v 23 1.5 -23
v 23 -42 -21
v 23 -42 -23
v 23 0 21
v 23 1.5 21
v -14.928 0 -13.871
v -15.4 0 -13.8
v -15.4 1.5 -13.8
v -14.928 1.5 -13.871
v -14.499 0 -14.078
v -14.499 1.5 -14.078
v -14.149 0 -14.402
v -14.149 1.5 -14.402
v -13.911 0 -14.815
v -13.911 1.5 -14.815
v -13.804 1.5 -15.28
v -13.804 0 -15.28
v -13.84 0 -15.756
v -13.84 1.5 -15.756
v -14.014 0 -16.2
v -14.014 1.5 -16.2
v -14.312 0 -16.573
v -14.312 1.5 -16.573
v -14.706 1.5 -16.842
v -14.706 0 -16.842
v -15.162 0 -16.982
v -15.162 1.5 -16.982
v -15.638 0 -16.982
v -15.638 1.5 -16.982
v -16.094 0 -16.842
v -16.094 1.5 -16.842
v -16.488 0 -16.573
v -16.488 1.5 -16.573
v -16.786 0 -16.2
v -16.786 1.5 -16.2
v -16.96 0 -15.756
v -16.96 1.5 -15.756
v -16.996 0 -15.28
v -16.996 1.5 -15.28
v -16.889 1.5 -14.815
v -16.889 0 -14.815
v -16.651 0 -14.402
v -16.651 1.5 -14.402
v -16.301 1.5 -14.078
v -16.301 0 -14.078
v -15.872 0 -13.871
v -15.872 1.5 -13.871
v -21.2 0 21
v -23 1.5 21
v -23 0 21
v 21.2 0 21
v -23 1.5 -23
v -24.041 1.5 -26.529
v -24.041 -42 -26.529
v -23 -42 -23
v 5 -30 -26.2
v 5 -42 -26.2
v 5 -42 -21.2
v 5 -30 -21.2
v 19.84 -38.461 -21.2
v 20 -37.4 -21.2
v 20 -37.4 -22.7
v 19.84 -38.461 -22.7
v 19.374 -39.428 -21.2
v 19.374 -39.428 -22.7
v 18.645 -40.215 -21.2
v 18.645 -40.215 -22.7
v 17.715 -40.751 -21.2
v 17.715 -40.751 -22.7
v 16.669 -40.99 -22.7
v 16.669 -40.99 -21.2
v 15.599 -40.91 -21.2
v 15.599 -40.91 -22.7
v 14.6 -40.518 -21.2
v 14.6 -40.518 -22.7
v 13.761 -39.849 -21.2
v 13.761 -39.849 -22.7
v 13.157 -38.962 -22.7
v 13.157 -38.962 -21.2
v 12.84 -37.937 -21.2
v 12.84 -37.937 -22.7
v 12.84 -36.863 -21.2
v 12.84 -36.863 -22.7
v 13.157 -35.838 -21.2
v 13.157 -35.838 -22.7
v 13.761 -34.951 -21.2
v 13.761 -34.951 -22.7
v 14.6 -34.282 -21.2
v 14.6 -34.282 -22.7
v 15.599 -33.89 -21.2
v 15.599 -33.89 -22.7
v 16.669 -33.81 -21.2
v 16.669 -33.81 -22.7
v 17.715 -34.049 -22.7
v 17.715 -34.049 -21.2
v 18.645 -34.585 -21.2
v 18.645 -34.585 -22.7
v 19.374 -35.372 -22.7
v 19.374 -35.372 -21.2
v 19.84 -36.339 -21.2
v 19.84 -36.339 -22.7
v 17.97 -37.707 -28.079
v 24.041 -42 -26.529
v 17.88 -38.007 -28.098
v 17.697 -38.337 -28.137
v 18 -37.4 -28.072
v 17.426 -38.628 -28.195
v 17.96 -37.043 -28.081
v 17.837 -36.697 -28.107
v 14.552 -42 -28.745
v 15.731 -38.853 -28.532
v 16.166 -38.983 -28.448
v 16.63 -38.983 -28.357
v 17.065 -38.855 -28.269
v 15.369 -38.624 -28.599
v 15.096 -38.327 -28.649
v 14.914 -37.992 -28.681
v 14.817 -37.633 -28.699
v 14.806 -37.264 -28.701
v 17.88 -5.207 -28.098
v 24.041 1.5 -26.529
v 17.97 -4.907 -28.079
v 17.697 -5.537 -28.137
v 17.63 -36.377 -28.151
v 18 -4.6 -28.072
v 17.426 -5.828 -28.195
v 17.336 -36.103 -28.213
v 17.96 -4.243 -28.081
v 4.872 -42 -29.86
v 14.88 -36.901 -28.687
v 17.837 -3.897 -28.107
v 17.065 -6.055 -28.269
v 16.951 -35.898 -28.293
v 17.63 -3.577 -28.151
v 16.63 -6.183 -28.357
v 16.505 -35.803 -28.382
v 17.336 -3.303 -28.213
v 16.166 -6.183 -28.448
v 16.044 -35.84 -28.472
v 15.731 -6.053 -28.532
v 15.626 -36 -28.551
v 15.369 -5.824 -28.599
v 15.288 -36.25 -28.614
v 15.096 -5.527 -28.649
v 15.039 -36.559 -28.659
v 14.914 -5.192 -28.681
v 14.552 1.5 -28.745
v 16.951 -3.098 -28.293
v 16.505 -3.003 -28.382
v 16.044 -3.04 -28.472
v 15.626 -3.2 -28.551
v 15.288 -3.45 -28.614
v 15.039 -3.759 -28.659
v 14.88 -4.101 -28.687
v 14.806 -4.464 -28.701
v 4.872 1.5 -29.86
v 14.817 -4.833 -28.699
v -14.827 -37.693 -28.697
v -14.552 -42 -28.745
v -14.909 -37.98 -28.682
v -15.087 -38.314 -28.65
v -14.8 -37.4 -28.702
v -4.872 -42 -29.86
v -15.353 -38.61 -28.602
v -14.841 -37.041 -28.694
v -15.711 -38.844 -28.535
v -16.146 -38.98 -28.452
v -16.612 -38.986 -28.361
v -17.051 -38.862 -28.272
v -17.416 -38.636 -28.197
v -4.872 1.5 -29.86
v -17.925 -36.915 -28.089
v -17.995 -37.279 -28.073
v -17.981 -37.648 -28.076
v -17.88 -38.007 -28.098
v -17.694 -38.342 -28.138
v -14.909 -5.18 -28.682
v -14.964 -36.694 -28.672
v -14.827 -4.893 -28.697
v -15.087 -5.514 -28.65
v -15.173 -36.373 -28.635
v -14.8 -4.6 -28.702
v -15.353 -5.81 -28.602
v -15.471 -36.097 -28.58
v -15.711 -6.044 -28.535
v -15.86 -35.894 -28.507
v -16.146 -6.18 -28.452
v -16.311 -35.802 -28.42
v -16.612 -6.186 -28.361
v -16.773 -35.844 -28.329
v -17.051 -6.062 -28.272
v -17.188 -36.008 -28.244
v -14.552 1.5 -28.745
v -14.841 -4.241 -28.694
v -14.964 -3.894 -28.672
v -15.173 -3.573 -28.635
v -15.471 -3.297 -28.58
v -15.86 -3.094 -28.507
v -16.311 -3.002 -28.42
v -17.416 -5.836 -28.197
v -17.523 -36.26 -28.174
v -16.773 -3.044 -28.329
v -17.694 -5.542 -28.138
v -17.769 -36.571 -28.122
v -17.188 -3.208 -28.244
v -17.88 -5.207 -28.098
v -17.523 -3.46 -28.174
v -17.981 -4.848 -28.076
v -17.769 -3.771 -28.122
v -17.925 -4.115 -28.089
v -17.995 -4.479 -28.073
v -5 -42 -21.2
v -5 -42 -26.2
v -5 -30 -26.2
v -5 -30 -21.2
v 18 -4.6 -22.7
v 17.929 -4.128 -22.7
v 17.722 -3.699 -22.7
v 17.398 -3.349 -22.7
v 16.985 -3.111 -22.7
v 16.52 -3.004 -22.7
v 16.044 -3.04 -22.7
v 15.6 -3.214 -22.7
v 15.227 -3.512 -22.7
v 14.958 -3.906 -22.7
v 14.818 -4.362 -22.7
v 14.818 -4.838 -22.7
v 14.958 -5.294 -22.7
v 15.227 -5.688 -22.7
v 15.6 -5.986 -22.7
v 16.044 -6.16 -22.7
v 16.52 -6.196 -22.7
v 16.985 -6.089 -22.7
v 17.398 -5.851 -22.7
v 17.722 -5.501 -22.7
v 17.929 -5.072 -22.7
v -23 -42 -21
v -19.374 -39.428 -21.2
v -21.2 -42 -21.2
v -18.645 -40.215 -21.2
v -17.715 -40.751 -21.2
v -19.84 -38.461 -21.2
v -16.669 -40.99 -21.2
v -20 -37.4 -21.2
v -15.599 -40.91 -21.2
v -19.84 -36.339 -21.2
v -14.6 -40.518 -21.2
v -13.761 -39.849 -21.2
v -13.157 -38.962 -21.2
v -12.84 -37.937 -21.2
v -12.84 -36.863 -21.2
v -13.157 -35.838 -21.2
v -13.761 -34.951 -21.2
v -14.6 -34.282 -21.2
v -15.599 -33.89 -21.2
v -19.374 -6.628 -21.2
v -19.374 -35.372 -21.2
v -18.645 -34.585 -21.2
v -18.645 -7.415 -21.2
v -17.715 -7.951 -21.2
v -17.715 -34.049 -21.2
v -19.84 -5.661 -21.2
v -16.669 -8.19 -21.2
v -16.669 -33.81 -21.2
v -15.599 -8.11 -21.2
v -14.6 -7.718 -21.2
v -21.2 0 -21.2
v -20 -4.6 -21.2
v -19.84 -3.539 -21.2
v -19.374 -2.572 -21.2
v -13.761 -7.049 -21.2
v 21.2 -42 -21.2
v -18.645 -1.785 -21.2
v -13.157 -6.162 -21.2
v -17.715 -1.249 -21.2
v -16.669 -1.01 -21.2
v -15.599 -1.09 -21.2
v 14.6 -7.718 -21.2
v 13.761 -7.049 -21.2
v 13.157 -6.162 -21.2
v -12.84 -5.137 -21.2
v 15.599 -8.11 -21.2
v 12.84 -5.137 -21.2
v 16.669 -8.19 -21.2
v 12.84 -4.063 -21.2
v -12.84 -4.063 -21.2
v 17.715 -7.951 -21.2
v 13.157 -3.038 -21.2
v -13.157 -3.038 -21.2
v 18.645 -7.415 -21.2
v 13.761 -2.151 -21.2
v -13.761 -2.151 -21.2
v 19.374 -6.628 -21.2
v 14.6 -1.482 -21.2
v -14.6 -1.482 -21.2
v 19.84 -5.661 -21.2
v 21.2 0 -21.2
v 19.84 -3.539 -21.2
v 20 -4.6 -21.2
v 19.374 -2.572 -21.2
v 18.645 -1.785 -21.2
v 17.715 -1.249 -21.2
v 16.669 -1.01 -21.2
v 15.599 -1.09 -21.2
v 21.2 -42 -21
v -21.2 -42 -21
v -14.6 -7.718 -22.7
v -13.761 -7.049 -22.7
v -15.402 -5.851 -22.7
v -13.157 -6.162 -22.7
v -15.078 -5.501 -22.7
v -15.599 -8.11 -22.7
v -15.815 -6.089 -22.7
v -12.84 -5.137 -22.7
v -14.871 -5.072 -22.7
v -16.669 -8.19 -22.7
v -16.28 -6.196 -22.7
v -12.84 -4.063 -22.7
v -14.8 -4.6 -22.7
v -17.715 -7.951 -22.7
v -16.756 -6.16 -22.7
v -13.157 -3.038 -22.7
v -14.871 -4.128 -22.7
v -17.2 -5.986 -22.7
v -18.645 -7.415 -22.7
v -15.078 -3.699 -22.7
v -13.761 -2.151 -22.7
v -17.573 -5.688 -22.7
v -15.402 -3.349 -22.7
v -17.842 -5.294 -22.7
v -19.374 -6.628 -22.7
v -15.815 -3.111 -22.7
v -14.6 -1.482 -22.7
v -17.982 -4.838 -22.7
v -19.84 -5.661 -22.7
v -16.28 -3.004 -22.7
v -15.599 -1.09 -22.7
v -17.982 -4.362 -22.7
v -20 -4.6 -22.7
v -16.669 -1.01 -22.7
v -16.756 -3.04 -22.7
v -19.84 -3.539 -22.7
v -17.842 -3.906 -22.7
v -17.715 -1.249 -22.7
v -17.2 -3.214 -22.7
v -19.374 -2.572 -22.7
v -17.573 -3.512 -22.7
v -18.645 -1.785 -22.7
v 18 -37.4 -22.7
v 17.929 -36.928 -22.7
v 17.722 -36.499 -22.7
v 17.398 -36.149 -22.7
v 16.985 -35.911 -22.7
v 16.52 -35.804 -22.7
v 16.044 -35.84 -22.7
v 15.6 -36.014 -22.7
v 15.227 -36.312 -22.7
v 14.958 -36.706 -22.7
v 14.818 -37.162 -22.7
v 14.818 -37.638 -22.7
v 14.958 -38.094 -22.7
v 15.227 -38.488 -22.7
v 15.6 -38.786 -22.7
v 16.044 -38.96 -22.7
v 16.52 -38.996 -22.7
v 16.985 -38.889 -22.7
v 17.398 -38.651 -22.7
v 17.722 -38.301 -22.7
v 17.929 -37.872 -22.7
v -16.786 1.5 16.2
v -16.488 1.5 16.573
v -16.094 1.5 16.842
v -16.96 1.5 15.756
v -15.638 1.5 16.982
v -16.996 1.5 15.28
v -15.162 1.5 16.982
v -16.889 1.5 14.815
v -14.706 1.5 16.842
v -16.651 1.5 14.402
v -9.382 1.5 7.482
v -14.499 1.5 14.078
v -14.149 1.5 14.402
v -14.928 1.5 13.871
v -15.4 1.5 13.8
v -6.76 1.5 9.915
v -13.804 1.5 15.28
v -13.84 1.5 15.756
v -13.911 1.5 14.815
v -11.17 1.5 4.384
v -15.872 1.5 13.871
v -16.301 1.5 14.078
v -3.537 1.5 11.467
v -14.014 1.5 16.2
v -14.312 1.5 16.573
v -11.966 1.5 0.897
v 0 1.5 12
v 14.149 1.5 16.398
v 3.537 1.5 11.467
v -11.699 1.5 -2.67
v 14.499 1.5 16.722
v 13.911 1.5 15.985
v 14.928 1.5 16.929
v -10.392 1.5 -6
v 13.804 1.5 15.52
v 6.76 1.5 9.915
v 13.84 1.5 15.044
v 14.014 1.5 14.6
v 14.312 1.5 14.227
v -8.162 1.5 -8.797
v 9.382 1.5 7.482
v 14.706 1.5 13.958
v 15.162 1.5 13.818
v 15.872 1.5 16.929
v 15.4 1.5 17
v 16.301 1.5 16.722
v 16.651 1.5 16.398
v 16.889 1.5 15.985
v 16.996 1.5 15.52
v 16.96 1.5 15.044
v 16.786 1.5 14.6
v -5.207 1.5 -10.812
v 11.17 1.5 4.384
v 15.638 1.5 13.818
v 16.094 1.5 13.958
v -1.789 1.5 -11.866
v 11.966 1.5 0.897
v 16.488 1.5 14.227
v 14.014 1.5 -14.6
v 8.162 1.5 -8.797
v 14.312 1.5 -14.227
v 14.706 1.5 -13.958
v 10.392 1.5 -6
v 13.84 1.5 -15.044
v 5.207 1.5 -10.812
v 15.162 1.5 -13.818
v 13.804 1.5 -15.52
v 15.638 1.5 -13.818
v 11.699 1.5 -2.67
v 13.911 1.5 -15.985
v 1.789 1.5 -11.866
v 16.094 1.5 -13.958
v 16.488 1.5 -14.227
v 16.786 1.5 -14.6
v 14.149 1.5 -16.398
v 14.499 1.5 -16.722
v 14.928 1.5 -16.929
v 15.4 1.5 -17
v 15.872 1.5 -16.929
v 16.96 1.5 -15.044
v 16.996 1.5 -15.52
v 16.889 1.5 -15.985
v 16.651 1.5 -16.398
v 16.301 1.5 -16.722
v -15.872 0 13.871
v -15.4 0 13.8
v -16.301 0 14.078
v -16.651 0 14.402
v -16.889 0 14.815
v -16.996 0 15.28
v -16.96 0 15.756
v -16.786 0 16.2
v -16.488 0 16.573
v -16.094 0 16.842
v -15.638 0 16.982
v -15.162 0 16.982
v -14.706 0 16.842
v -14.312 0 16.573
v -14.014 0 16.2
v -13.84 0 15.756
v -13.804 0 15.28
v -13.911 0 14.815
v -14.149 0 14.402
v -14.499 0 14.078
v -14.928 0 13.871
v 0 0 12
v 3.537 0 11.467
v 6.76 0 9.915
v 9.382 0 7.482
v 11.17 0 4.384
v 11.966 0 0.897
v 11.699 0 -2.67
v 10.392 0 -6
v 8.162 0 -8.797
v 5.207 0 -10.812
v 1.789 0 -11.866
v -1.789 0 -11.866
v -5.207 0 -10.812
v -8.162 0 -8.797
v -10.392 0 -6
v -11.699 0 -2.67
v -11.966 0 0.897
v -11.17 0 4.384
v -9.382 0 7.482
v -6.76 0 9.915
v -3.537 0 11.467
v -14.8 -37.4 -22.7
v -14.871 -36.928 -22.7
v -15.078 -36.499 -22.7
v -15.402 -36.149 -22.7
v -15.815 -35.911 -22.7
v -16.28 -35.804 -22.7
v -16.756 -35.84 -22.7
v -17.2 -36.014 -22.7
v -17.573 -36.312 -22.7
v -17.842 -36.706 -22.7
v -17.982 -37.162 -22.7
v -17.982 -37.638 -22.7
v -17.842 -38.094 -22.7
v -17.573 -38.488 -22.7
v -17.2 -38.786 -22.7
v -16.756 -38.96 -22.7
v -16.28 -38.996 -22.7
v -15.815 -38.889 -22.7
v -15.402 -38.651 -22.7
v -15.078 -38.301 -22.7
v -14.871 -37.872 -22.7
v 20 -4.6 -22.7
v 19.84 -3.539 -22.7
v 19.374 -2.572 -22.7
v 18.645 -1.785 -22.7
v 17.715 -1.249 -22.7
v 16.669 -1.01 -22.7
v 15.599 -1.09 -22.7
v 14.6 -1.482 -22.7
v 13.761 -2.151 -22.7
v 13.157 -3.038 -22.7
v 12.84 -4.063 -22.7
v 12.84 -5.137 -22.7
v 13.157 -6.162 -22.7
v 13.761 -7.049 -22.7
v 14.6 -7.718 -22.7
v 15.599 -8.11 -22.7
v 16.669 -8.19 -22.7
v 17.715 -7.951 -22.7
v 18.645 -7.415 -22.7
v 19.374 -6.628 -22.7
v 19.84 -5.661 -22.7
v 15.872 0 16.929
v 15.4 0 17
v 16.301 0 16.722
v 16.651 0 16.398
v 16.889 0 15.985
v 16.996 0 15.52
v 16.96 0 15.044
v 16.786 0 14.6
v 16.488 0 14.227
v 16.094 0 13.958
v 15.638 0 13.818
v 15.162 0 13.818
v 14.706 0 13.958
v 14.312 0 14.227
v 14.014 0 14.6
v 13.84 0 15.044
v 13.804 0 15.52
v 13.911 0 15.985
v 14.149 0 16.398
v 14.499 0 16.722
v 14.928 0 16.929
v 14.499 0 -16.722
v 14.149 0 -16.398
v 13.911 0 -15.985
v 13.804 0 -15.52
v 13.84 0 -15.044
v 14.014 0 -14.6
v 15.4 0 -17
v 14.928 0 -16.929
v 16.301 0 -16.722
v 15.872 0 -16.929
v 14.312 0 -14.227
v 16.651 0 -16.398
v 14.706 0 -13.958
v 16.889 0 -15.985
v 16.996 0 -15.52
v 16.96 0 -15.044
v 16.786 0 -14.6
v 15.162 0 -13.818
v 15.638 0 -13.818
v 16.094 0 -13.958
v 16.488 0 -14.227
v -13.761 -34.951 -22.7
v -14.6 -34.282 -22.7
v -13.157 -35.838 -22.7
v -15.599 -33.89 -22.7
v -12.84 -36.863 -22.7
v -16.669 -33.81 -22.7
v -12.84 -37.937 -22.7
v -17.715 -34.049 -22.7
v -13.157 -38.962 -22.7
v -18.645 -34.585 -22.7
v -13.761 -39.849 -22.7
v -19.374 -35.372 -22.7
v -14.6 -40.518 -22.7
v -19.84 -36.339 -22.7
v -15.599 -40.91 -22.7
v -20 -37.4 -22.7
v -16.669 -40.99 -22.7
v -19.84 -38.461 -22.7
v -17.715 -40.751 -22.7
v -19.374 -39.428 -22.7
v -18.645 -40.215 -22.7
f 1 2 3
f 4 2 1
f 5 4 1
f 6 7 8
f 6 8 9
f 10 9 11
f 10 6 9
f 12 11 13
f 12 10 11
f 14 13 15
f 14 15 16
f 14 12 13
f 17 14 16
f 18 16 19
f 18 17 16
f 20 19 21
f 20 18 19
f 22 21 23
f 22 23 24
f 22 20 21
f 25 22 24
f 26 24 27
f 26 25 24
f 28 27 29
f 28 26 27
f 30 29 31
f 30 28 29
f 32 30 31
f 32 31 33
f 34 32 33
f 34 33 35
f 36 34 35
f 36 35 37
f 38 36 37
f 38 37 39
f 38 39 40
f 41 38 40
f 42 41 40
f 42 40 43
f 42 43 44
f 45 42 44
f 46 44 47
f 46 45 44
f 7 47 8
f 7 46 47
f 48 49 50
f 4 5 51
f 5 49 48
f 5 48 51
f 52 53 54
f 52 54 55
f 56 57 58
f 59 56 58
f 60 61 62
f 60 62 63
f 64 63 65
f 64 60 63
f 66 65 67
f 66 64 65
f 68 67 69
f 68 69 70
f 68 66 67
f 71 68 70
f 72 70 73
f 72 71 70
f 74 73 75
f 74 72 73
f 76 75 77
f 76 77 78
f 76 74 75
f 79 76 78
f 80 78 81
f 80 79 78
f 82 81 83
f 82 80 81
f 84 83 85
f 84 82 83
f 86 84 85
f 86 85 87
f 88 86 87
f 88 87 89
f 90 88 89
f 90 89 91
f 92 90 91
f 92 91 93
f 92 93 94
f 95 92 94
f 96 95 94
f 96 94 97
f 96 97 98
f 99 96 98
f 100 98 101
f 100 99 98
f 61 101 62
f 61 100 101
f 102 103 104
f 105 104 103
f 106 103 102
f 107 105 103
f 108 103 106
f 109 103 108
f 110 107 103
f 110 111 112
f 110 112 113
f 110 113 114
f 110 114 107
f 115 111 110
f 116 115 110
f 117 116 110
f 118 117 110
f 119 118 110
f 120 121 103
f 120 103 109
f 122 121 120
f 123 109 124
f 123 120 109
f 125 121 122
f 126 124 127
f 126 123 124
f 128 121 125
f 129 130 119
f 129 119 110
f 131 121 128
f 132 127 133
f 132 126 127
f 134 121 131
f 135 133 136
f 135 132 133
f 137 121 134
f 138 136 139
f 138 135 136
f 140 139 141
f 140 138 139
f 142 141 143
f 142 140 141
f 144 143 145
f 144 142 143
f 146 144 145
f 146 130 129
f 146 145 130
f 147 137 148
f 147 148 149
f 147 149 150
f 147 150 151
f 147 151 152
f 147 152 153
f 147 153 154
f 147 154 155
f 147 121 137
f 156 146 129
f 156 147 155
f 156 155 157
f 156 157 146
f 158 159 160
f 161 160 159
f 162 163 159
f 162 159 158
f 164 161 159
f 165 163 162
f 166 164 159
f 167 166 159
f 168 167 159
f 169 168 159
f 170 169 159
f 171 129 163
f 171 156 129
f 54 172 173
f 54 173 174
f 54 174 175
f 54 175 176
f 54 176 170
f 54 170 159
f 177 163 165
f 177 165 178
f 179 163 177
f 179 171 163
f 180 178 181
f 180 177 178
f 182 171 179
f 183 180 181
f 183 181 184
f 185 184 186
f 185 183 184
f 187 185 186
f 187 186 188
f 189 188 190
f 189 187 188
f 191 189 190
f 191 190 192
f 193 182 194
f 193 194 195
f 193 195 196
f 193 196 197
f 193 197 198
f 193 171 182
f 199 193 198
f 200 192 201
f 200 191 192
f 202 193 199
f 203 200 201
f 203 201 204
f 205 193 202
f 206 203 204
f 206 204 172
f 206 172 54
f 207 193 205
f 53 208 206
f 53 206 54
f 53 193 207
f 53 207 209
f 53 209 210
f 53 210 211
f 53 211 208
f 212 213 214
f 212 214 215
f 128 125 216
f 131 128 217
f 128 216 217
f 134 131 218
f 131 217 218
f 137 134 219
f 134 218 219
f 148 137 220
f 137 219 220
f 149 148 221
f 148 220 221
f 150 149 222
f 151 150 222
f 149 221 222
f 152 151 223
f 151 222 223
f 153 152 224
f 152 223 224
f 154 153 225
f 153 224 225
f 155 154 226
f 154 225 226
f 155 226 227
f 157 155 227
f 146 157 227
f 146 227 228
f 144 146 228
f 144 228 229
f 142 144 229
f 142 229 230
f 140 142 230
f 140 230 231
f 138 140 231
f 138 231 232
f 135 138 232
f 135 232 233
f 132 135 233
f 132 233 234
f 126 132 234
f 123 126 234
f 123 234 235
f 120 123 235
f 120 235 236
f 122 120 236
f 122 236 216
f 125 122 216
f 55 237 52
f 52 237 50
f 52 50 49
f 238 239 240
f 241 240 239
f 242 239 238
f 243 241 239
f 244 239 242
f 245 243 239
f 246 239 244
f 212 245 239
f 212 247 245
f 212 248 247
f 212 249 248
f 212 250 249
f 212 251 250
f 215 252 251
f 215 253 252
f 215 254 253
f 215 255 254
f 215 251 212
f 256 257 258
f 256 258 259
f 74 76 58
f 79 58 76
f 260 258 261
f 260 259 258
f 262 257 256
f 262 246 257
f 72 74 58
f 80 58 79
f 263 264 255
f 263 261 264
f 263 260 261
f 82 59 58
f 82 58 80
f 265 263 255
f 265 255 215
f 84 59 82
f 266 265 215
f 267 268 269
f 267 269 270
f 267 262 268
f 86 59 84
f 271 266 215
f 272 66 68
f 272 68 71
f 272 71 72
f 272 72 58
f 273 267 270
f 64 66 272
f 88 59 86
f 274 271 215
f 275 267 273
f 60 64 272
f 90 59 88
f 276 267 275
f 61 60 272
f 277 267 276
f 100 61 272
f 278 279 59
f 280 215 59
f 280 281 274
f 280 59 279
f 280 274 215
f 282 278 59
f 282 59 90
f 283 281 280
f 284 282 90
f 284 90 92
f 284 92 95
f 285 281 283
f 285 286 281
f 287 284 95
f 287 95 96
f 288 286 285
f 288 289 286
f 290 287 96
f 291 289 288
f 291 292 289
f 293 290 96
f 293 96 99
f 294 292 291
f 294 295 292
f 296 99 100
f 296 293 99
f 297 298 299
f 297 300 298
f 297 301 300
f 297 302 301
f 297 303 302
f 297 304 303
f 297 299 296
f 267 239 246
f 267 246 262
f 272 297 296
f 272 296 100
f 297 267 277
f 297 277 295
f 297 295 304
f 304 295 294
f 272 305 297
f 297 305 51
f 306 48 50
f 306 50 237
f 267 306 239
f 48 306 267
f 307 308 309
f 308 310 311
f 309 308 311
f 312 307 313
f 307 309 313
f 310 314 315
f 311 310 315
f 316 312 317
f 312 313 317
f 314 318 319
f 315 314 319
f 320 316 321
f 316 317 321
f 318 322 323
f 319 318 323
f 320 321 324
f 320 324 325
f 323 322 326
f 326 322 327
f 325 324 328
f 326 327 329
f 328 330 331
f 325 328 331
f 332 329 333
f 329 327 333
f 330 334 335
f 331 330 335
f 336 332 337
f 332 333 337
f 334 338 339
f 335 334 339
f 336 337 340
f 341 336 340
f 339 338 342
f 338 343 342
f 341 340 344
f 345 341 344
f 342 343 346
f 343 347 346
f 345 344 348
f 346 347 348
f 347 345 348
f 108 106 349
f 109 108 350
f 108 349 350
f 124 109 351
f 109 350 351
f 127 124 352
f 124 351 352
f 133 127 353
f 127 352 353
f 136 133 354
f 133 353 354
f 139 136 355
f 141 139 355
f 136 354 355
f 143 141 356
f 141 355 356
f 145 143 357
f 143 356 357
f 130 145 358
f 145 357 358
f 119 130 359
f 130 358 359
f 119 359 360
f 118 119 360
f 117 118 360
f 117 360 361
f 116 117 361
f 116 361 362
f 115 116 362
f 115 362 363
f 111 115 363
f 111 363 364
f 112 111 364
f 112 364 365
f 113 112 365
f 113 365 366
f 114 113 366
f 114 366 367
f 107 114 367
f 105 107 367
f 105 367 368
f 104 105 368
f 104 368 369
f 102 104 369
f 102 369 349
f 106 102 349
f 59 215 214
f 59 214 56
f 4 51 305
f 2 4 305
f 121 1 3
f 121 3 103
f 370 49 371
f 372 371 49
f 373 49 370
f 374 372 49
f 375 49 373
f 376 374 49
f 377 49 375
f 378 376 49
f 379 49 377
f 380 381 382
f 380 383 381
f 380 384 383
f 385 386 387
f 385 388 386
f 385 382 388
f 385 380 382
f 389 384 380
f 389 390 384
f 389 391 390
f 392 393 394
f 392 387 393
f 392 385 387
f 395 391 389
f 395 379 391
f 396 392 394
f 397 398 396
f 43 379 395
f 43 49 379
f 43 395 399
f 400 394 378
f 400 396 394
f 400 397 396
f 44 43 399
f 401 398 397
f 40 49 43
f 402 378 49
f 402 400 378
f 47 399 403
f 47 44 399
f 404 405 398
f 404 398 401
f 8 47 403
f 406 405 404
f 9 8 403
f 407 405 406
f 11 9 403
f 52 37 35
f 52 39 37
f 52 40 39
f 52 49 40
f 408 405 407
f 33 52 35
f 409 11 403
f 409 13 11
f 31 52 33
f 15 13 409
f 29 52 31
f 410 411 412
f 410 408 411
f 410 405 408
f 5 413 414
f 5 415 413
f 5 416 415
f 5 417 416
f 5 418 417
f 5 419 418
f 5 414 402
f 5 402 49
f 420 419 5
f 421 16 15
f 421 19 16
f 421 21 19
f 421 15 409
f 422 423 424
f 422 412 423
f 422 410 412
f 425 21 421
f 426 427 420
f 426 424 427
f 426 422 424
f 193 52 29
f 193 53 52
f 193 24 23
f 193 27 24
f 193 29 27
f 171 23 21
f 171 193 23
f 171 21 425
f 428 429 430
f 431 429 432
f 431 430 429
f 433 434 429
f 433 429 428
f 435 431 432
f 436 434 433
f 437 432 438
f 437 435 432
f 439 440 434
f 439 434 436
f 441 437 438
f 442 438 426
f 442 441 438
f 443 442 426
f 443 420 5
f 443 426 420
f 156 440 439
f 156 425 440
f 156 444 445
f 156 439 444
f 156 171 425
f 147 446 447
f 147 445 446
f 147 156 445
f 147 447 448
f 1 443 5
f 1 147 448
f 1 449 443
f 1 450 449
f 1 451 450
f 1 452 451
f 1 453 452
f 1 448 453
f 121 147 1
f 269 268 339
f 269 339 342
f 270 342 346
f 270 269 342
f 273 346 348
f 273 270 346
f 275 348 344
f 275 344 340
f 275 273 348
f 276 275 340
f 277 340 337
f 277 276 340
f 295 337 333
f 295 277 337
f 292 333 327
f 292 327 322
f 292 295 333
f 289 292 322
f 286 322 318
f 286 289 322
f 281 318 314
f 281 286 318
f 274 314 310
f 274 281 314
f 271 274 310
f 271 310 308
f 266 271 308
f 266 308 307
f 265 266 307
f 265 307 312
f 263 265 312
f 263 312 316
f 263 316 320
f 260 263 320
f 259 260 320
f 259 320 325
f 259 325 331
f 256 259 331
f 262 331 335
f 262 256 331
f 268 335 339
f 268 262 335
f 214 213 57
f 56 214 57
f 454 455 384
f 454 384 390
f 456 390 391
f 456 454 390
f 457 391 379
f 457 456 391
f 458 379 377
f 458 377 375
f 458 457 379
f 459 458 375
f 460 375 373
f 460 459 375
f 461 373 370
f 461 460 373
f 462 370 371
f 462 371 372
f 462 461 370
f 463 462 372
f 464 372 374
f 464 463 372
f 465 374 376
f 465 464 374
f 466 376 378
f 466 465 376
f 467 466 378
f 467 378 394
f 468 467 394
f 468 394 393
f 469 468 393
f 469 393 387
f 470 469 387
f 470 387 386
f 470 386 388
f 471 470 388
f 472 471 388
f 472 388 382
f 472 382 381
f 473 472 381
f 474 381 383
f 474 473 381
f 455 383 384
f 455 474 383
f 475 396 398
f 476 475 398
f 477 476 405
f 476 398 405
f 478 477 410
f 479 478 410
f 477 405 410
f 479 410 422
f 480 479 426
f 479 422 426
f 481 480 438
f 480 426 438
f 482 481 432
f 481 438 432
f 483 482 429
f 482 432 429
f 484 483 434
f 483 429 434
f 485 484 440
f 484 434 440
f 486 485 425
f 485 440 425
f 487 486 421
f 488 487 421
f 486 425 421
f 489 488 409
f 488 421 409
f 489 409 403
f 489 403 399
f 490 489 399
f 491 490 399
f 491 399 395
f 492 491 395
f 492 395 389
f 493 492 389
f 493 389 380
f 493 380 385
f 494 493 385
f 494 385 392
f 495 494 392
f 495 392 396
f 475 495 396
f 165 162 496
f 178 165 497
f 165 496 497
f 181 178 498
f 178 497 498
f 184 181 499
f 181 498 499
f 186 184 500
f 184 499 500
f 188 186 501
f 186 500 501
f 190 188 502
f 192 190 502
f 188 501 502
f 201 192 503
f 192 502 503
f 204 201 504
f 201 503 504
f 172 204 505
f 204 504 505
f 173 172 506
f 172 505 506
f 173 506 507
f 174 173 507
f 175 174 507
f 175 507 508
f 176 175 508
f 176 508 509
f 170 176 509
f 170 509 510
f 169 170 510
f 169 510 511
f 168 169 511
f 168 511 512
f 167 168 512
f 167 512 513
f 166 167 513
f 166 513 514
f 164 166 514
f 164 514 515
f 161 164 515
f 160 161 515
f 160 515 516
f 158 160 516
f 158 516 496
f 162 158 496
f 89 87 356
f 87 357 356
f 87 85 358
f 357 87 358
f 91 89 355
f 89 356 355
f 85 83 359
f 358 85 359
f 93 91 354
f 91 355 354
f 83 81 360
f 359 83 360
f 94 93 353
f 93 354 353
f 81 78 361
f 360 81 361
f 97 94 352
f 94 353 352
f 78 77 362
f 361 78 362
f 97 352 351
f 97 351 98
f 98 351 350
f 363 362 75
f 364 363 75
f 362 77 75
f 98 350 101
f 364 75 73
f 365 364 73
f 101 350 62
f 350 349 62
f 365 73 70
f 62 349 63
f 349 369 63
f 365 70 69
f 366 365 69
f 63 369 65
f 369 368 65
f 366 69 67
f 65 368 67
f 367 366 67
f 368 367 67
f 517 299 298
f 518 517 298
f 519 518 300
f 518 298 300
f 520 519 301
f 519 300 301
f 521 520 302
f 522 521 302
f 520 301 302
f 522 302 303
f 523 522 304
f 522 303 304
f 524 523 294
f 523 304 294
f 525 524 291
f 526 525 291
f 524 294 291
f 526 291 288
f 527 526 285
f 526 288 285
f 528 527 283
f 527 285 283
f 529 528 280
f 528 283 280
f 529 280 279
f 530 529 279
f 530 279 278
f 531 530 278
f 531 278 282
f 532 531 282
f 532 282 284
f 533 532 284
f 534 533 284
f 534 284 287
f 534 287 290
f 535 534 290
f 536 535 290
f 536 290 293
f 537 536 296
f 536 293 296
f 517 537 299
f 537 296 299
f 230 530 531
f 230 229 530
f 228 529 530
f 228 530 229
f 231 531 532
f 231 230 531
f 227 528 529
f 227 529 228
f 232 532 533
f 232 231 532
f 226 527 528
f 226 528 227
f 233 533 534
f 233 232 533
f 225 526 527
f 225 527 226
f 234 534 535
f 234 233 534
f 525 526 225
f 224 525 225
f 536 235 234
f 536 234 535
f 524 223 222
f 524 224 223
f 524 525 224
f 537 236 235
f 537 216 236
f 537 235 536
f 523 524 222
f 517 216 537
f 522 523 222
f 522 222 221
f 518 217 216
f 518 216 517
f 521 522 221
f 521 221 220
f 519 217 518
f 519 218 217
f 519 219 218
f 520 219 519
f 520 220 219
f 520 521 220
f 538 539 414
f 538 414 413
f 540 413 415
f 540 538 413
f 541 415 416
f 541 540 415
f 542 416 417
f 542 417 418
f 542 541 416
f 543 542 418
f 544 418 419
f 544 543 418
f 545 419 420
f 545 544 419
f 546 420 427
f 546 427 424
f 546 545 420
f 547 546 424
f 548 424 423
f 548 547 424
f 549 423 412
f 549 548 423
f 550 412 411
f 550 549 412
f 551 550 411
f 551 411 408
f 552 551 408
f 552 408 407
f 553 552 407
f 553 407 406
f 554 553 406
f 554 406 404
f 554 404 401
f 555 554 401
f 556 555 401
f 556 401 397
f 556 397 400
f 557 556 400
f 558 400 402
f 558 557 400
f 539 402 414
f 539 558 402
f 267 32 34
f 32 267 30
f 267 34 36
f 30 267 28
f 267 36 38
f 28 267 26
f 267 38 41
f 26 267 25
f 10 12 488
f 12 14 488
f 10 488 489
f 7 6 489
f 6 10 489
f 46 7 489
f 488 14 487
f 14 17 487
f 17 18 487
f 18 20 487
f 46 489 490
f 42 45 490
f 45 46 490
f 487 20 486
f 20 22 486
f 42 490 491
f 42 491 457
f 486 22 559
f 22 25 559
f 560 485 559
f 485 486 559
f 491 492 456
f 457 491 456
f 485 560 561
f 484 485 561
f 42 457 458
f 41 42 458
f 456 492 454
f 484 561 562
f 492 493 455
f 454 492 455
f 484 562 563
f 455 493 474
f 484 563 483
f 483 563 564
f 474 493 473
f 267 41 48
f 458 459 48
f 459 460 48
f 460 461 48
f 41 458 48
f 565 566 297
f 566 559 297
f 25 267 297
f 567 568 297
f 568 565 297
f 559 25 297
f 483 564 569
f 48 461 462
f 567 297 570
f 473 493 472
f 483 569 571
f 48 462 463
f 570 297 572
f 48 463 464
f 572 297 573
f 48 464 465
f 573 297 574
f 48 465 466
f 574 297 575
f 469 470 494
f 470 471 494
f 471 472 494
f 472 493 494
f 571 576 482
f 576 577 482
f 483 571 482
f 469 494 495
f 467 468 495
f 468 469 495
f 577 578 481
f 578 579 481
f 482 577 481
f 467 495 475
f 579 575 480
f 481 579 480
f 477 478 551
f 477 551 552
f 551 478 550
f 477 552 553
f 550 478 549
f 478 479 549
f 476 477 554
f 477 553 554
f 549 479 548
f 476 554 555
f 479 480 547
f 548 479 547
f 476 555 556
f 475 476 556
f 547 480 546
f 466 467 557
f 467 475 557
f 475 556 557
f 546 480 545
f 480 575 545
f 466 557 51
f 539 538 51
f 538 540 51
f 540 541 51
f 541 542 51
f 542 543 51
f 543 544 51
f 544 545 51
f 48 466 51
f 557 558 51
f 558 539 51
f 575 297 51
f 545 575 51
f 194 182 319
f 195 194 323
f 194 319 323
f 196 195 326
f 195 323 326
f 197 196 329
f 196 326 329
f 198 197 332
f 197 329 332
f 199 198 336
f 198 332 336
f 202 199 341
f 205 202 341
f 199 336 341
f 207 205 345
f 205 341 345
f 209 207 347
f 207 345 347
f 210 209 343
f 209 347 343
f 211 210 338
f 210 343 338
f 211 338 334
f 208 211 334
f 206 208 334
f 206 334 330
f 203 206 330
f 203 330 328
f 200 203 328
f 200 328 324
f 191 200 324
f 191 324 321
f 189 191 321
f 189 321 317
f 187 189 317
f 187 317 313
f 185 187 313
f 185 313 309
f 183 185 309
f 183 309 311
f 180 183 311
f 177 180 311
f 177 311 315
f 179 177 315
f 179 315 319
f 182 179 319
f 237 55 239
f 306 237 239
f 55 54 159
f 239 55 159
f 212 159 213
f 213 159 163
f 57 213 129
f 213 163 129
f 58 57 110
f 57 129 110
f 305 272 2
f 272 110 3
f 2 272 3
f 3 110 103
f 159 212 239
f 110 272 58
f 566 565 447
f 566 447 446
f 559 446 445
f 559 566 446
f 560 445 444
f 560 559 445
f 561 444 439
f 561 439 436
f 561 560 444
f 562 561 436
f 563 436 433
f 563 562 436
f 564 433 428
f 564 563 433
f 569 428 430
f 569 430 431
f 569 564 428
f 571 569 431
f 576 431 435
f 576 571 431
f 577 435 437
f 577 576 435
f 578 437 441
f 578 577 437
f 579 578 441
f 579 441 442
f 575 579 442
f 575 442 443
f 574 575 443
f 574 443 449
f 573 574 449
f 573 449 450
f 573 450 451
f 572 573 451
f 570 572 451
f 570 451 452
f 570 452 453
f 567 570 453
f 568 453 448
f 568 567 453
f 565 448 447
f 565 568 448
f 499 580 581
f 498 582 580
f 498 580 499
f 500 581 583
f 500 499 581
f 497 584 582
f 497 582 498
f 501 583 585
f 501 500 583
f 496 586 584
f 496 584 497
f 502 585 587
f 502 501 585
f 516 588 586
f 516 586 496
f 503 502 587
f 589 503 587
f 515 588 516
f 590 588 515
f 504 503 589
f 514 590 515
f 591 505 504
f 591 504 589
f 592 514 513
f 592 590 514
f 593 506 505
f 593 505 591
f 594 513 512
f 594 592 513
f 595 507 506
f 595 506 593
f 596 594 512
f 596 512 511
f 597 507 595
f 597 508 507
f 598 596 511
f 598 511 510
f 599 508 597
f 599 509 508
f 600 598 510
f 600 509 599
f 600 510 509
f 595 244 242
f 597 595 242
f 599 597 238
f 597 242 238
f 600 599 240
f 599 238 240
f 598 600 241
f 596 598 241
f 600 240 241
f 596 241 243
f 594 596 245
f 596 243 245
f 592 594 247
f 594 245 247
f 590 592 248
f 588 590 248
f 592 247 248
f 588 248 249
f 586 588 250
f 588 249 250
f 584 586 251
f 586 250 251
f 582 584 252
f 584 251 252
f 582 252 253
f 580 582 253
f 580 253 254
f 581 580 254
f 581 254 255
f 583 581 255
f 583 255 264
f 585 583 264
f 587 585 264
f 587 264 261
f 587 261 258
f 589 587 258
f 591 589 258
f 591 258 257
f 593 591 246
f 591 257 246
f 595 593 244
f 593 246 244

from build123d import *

# Parameters (mm, degrees)
SKETCH4_W                                  = 42
SKETCH4_H                                  = 42
SKETCH4_R                                  = 1.6
BOSS_EXTRUDE1_DEPTH                        = 1.5
SKETCH5_R                                  = 12
CUT_EXTRUDE1_DEPTH                         = 30.736341402
BOSS_EXTRUDE2_DEPTH                        = 2
SKETCH7_W                                  = 46
SKETCH7_H                                  = 43.5
BOSS_EXTRUDE3_DEPTH                        = 2
CUT_EXTRUDE2_DEPTH                         = 0.2
SKETCH9_W                                  = 42.4
SKETCH9_H                                  = 42
CUT_EXTRUDE3_DEPTH                         = 0.2
BOSS_EXTRUDE4_DEPTH                        = 43.5
SKETCH16_W                                 = 10
SKETCH16_H                                 = 5
CUT_EXTRUDE6_DEPTH                         = 12
SKETCH12_R                                 = 1.6
CUT_EXTRUDE8_DEPTH                         = 65.209004806
SKETCH18_R                                 = 3.6
CUT_EXTRUDE9_DEPTH                         = 1.5
MIRROR7_AT_THE_SECOND_PLANE_COPY_1_SKETC_R = 3.6
MIRROR7_AT_THE_SECOND_PLANE_COPY_1_DEPTH   = 1.5
CUT_EXTRUDE10_REACH                        = 66.209
CUT_EXTRUDE10_END_RADIUS                   = 85
SKETCH22_R                                 = 1.6


with BuildPart() as part:
    # Sketch4 → Boss-Extrude1 (new body)
    with BuildSketch(Plane(origin=(0, 0, 0), x_dir=(1, 0, 0), z_dir=(0, 1, 0))):
        Rectangle(SKETCH4_W, SKETCH4_H)
        with Locations(Location((-15.4, 15.4, 0), (0, 0, 270))):
            Circle(SKETCH4_R, mode=Mode.SUBTRACT)
        with Locations(Location((15.4, 15.4, 0), (0, 0, 90))):
            Circle(SKETCH4_R, mode=Mode.SUBTRACT)
        with Locations(Location((15.4, -15.4, 0), (0, 0, 270))):
            Circle(SKETCH4_R, mode=Mode.SUBTRACT)
        with Locations(Location((-15.4, -15.4, 0), (0, 0, 90))):
            Circle(SKETCH4_R, mode=Mode.SUBTRACT)
    extrude(amount=BOSS_EXTRUDE1_DEPTH)

    # Sketch5 → Cut-Extrude1 (cut, through all)
    with BuildSketch(Plane(origin=(0, 1.5, 0), x_dir=(1, 0, 0), z_dir=(0, 1, 0))):
        with Locations(Location((0, 0, 0), (0, 0, 270))):
            Circle(SKETCH5_R)
    extrude(amount=-CUT_EXTRUDE1_DEPTH, mode=Mode.SUBTRACT)

    # Sketch6 → Boss-Extrude2 (add)
    with BuildSketch(Plane(origin=(21, 0, 0), x_dir=(0, 0, -1), z_dir=(1, 0, 0))):
        Polygon((-21, 0), (21, -42), (21, 0), (21, 1.5), (-21, 1.5), align=None)
    boss_extrude2 = extrude(amount=BOSS_EXTRUDE2_DEPTH)

    # Mirror1: Boss-Extrude2 across plane
    add(boss_extrude2.mirror(Plane(origin=(0, 0, 0), x_dir=(0, 0, 1), z_dir=(1, 0, 0))))

    # Sketch7 → Boss-Extrude3 (add)
    with BuildSketch(Plane(origin=(0, 0, -21), x_dir=(-1, 0, 0), z_dir=(0, 0, -1))):
        with Locations((0, -20.25)):
            Rectangle(SKETCH7_W, SKETCH7_H)
    extrude(amount=BOSS_EXTRUDE3_DEPTH)

    # Sketch8 → Cut-Extrude2 (cut)
    with BuildSketch(Plane(origin=(-21, 0, 0), x_dir=(0, 0, -1), z_dir=(1, 0, 0))):
        Polygon((-21, 0), (21, -42), (21, 0), align=None)
    cut_extrude2 = extrude(amount=-CUT_EXTRUDE2_DEPTH, mode=Mode.SUBTRACT)

    # Mirror2: Cut-Extrude2 across plane
    add(cut_extrude2.mirror(Plane(origin=(0, 0, 0), x_dir=(0, 0, 1), z_dir=(1, 0, 0))), mode=Mode.SUBTRACT)

    # Sketch9 → Cut-Extrude3 (cut)
    with BuildSketch(Plane.XY.offset(-21)):
        with Locations((0, -21)):
            Rectangle(SKETCH9_W, SKETCH9_H)
    extrude(amount=-CUT_EXTRUDE3_DEPTH, mode=Mode.SUBTRACT)

    # Sketch14 → Boss-Extrude4 (add)
    with BuildSketch(Plane(origin=(0, 1.5, 0), x_dir=(1, 0, 0), z_dir=(0, 1, 0))):
        with BuildLine():
            Line((-23, 23), (23, 23))
            Line((23, 23), (24.040721666, 26.529403909))
            ThreePointArc((24.040721666, 26.529403909), (0, 30), (-24.040721666, 26.529403909))
            Line((-24.040721666, 26.529403909), (-23, 23))
        make_face()
    extrude(amount=-BOSS_EXTRUDE4_DEPTH)

    # Sketch16 → Cut-Extrude6 (cut)
    with BuildSketch(Plane.XZ.offset(42)):
        with Locations((0, -23.7)):
            Rectangle(SKETCH16_W, SKETCH16_H)
    extrude(amount=-CUT_EXTRUDE6_DEPTH, mode=Mode.SUBTRACT)

    # Sketch12 → Cut-Extrude8 (cut, through all)
    with BuildSketch(Plane.XY.offset(-21.2)):
        with Locations((16.4, -4.6)):
            Circle(SKETCH12_R)
    extrude(amount=-CUT_EXTRUDE8_DEPTH, mode=Mode.SUBTRACT)

    # Sketch18 → Cut-Extrude9 (cut)
    with BuildSketch(Plane.XY.offset(-21.2)):
        with Locations((16.4, -4.6)):
            Circle(SKETCH18_R)
    cut_extrude9 = extrude(amount=-CUT_EXTRUDE9_DEPTH, mode=Mode.SUBTRACT)

    # Mirror7: Cut-Extrude9 across plane
    add(cut_extrude9.mirror(Plane(origin=(0, -21, 0), x_dir=(0, 0, 1), z_dir=(0, -1, 0))), mode=Mode.SUBTRACT)

    # Mirror7 at the second plane: Cut-Extrude9 across plane
    add(cut_extrude9.mirror(Plane(origin=(0, 0, 0), x_dir=(0, 0, 1), z_dir=(1, 0, 0))), mode=Mode.SUBTRACT)

    # Mirror7 at the second plane copy 1 sketc → Mirror7 at the second plane copy 1 (cut)
    with BuildSketch(Plane(origin=(0, -42, -21.2), x_dir=(-1, 0, 0), z_dir=(0, 0, 1))):
        with Locations((16.4, -4.6)):
            Circle(MIRROR7_AT_THE_SECOND_PLANE_COPY_1_SKETC_R)
    extrude(amount=-MIRROR7_AT_THE_SECOND_PLANE_COPY_1_DEPTH, mode=Mode.SUBTRACT)

    # Cut-Extrude10: up to this cylinder (the profile starts inside it)
    cut_extrude10_end = Plane(origin=(0, -21, 55), z_dir=(0, 1, 0)) * Cylinder(CUT_EXTRUDE10_END_RADIUS, 336.218, mode=Mode.PRIVATE)
    # Sketch22 → Cut-Extrude10 (cut, up to the surface)
    with BuildSketch(Plane.XY.offset(-21.2), mode=Mode.PRIVATE) as cut_extrude10_sk1:
        with Locations((-16.4, -37.4)):
            Circle(SKETCH22_R)
    cut_extrude10_tool1 = extrude(cut_extrude10_sk1.sketch, amount=-CUT_EXTRUDE10_REACH, mode=Mode.PRIVATE) & cut_extrude10_end
    add(cut_extrude10_tool1.solids().sort_by_distance((-16.4, -37.4, -21.2))[0], mode=Mode.SUBTRACT)
    # Sketch22 → Cut-Extrude10 (cut, up to the surface)
    with BuildSketch(Plane.XY.offset(-21.2), mode=Mode.PRIVATE) as cut_extrude10_sk2:
        with Locations((-16.4, -4.6)):
            Circle(SKETCH22_R)
    cut_extrude10_tool2 = extrude(cut_extrude10_sk2.sketch, amount=-CUT_EXTRUDE10_REACH, mode=Mode.PRIVATE) & cut_extrude10_end
    add(cut_extrude10_tool2.solids().sort_by_distance((-16.4, -4.6, -21.2))[0], mode=Mode.SUBTRACT)
    # Sketch22 → Cut-Extrude10 (cut, up to the surface)
    with BuildSketch(Plane.XY.offset(-21.2), mode=Mode.PRIVATE) as cut_extrude10_sk3:
        with Locations((16.4, -37.4)):
            Circle(SKETCH22_R)
    cut_extrude10_tool3 = extrude(cut_extrude10_sk3.sketch, amount=-CUT_EXTRUDE10_REACH, mode=Mode.PRIVATE) & cut_extrude10_end
    add(cut_extrude10_tool3.solids().sort_by_distance((16.4, -37.4, -21.2))[0], mode=Mode.SUBTRACT)


solid = part.part
